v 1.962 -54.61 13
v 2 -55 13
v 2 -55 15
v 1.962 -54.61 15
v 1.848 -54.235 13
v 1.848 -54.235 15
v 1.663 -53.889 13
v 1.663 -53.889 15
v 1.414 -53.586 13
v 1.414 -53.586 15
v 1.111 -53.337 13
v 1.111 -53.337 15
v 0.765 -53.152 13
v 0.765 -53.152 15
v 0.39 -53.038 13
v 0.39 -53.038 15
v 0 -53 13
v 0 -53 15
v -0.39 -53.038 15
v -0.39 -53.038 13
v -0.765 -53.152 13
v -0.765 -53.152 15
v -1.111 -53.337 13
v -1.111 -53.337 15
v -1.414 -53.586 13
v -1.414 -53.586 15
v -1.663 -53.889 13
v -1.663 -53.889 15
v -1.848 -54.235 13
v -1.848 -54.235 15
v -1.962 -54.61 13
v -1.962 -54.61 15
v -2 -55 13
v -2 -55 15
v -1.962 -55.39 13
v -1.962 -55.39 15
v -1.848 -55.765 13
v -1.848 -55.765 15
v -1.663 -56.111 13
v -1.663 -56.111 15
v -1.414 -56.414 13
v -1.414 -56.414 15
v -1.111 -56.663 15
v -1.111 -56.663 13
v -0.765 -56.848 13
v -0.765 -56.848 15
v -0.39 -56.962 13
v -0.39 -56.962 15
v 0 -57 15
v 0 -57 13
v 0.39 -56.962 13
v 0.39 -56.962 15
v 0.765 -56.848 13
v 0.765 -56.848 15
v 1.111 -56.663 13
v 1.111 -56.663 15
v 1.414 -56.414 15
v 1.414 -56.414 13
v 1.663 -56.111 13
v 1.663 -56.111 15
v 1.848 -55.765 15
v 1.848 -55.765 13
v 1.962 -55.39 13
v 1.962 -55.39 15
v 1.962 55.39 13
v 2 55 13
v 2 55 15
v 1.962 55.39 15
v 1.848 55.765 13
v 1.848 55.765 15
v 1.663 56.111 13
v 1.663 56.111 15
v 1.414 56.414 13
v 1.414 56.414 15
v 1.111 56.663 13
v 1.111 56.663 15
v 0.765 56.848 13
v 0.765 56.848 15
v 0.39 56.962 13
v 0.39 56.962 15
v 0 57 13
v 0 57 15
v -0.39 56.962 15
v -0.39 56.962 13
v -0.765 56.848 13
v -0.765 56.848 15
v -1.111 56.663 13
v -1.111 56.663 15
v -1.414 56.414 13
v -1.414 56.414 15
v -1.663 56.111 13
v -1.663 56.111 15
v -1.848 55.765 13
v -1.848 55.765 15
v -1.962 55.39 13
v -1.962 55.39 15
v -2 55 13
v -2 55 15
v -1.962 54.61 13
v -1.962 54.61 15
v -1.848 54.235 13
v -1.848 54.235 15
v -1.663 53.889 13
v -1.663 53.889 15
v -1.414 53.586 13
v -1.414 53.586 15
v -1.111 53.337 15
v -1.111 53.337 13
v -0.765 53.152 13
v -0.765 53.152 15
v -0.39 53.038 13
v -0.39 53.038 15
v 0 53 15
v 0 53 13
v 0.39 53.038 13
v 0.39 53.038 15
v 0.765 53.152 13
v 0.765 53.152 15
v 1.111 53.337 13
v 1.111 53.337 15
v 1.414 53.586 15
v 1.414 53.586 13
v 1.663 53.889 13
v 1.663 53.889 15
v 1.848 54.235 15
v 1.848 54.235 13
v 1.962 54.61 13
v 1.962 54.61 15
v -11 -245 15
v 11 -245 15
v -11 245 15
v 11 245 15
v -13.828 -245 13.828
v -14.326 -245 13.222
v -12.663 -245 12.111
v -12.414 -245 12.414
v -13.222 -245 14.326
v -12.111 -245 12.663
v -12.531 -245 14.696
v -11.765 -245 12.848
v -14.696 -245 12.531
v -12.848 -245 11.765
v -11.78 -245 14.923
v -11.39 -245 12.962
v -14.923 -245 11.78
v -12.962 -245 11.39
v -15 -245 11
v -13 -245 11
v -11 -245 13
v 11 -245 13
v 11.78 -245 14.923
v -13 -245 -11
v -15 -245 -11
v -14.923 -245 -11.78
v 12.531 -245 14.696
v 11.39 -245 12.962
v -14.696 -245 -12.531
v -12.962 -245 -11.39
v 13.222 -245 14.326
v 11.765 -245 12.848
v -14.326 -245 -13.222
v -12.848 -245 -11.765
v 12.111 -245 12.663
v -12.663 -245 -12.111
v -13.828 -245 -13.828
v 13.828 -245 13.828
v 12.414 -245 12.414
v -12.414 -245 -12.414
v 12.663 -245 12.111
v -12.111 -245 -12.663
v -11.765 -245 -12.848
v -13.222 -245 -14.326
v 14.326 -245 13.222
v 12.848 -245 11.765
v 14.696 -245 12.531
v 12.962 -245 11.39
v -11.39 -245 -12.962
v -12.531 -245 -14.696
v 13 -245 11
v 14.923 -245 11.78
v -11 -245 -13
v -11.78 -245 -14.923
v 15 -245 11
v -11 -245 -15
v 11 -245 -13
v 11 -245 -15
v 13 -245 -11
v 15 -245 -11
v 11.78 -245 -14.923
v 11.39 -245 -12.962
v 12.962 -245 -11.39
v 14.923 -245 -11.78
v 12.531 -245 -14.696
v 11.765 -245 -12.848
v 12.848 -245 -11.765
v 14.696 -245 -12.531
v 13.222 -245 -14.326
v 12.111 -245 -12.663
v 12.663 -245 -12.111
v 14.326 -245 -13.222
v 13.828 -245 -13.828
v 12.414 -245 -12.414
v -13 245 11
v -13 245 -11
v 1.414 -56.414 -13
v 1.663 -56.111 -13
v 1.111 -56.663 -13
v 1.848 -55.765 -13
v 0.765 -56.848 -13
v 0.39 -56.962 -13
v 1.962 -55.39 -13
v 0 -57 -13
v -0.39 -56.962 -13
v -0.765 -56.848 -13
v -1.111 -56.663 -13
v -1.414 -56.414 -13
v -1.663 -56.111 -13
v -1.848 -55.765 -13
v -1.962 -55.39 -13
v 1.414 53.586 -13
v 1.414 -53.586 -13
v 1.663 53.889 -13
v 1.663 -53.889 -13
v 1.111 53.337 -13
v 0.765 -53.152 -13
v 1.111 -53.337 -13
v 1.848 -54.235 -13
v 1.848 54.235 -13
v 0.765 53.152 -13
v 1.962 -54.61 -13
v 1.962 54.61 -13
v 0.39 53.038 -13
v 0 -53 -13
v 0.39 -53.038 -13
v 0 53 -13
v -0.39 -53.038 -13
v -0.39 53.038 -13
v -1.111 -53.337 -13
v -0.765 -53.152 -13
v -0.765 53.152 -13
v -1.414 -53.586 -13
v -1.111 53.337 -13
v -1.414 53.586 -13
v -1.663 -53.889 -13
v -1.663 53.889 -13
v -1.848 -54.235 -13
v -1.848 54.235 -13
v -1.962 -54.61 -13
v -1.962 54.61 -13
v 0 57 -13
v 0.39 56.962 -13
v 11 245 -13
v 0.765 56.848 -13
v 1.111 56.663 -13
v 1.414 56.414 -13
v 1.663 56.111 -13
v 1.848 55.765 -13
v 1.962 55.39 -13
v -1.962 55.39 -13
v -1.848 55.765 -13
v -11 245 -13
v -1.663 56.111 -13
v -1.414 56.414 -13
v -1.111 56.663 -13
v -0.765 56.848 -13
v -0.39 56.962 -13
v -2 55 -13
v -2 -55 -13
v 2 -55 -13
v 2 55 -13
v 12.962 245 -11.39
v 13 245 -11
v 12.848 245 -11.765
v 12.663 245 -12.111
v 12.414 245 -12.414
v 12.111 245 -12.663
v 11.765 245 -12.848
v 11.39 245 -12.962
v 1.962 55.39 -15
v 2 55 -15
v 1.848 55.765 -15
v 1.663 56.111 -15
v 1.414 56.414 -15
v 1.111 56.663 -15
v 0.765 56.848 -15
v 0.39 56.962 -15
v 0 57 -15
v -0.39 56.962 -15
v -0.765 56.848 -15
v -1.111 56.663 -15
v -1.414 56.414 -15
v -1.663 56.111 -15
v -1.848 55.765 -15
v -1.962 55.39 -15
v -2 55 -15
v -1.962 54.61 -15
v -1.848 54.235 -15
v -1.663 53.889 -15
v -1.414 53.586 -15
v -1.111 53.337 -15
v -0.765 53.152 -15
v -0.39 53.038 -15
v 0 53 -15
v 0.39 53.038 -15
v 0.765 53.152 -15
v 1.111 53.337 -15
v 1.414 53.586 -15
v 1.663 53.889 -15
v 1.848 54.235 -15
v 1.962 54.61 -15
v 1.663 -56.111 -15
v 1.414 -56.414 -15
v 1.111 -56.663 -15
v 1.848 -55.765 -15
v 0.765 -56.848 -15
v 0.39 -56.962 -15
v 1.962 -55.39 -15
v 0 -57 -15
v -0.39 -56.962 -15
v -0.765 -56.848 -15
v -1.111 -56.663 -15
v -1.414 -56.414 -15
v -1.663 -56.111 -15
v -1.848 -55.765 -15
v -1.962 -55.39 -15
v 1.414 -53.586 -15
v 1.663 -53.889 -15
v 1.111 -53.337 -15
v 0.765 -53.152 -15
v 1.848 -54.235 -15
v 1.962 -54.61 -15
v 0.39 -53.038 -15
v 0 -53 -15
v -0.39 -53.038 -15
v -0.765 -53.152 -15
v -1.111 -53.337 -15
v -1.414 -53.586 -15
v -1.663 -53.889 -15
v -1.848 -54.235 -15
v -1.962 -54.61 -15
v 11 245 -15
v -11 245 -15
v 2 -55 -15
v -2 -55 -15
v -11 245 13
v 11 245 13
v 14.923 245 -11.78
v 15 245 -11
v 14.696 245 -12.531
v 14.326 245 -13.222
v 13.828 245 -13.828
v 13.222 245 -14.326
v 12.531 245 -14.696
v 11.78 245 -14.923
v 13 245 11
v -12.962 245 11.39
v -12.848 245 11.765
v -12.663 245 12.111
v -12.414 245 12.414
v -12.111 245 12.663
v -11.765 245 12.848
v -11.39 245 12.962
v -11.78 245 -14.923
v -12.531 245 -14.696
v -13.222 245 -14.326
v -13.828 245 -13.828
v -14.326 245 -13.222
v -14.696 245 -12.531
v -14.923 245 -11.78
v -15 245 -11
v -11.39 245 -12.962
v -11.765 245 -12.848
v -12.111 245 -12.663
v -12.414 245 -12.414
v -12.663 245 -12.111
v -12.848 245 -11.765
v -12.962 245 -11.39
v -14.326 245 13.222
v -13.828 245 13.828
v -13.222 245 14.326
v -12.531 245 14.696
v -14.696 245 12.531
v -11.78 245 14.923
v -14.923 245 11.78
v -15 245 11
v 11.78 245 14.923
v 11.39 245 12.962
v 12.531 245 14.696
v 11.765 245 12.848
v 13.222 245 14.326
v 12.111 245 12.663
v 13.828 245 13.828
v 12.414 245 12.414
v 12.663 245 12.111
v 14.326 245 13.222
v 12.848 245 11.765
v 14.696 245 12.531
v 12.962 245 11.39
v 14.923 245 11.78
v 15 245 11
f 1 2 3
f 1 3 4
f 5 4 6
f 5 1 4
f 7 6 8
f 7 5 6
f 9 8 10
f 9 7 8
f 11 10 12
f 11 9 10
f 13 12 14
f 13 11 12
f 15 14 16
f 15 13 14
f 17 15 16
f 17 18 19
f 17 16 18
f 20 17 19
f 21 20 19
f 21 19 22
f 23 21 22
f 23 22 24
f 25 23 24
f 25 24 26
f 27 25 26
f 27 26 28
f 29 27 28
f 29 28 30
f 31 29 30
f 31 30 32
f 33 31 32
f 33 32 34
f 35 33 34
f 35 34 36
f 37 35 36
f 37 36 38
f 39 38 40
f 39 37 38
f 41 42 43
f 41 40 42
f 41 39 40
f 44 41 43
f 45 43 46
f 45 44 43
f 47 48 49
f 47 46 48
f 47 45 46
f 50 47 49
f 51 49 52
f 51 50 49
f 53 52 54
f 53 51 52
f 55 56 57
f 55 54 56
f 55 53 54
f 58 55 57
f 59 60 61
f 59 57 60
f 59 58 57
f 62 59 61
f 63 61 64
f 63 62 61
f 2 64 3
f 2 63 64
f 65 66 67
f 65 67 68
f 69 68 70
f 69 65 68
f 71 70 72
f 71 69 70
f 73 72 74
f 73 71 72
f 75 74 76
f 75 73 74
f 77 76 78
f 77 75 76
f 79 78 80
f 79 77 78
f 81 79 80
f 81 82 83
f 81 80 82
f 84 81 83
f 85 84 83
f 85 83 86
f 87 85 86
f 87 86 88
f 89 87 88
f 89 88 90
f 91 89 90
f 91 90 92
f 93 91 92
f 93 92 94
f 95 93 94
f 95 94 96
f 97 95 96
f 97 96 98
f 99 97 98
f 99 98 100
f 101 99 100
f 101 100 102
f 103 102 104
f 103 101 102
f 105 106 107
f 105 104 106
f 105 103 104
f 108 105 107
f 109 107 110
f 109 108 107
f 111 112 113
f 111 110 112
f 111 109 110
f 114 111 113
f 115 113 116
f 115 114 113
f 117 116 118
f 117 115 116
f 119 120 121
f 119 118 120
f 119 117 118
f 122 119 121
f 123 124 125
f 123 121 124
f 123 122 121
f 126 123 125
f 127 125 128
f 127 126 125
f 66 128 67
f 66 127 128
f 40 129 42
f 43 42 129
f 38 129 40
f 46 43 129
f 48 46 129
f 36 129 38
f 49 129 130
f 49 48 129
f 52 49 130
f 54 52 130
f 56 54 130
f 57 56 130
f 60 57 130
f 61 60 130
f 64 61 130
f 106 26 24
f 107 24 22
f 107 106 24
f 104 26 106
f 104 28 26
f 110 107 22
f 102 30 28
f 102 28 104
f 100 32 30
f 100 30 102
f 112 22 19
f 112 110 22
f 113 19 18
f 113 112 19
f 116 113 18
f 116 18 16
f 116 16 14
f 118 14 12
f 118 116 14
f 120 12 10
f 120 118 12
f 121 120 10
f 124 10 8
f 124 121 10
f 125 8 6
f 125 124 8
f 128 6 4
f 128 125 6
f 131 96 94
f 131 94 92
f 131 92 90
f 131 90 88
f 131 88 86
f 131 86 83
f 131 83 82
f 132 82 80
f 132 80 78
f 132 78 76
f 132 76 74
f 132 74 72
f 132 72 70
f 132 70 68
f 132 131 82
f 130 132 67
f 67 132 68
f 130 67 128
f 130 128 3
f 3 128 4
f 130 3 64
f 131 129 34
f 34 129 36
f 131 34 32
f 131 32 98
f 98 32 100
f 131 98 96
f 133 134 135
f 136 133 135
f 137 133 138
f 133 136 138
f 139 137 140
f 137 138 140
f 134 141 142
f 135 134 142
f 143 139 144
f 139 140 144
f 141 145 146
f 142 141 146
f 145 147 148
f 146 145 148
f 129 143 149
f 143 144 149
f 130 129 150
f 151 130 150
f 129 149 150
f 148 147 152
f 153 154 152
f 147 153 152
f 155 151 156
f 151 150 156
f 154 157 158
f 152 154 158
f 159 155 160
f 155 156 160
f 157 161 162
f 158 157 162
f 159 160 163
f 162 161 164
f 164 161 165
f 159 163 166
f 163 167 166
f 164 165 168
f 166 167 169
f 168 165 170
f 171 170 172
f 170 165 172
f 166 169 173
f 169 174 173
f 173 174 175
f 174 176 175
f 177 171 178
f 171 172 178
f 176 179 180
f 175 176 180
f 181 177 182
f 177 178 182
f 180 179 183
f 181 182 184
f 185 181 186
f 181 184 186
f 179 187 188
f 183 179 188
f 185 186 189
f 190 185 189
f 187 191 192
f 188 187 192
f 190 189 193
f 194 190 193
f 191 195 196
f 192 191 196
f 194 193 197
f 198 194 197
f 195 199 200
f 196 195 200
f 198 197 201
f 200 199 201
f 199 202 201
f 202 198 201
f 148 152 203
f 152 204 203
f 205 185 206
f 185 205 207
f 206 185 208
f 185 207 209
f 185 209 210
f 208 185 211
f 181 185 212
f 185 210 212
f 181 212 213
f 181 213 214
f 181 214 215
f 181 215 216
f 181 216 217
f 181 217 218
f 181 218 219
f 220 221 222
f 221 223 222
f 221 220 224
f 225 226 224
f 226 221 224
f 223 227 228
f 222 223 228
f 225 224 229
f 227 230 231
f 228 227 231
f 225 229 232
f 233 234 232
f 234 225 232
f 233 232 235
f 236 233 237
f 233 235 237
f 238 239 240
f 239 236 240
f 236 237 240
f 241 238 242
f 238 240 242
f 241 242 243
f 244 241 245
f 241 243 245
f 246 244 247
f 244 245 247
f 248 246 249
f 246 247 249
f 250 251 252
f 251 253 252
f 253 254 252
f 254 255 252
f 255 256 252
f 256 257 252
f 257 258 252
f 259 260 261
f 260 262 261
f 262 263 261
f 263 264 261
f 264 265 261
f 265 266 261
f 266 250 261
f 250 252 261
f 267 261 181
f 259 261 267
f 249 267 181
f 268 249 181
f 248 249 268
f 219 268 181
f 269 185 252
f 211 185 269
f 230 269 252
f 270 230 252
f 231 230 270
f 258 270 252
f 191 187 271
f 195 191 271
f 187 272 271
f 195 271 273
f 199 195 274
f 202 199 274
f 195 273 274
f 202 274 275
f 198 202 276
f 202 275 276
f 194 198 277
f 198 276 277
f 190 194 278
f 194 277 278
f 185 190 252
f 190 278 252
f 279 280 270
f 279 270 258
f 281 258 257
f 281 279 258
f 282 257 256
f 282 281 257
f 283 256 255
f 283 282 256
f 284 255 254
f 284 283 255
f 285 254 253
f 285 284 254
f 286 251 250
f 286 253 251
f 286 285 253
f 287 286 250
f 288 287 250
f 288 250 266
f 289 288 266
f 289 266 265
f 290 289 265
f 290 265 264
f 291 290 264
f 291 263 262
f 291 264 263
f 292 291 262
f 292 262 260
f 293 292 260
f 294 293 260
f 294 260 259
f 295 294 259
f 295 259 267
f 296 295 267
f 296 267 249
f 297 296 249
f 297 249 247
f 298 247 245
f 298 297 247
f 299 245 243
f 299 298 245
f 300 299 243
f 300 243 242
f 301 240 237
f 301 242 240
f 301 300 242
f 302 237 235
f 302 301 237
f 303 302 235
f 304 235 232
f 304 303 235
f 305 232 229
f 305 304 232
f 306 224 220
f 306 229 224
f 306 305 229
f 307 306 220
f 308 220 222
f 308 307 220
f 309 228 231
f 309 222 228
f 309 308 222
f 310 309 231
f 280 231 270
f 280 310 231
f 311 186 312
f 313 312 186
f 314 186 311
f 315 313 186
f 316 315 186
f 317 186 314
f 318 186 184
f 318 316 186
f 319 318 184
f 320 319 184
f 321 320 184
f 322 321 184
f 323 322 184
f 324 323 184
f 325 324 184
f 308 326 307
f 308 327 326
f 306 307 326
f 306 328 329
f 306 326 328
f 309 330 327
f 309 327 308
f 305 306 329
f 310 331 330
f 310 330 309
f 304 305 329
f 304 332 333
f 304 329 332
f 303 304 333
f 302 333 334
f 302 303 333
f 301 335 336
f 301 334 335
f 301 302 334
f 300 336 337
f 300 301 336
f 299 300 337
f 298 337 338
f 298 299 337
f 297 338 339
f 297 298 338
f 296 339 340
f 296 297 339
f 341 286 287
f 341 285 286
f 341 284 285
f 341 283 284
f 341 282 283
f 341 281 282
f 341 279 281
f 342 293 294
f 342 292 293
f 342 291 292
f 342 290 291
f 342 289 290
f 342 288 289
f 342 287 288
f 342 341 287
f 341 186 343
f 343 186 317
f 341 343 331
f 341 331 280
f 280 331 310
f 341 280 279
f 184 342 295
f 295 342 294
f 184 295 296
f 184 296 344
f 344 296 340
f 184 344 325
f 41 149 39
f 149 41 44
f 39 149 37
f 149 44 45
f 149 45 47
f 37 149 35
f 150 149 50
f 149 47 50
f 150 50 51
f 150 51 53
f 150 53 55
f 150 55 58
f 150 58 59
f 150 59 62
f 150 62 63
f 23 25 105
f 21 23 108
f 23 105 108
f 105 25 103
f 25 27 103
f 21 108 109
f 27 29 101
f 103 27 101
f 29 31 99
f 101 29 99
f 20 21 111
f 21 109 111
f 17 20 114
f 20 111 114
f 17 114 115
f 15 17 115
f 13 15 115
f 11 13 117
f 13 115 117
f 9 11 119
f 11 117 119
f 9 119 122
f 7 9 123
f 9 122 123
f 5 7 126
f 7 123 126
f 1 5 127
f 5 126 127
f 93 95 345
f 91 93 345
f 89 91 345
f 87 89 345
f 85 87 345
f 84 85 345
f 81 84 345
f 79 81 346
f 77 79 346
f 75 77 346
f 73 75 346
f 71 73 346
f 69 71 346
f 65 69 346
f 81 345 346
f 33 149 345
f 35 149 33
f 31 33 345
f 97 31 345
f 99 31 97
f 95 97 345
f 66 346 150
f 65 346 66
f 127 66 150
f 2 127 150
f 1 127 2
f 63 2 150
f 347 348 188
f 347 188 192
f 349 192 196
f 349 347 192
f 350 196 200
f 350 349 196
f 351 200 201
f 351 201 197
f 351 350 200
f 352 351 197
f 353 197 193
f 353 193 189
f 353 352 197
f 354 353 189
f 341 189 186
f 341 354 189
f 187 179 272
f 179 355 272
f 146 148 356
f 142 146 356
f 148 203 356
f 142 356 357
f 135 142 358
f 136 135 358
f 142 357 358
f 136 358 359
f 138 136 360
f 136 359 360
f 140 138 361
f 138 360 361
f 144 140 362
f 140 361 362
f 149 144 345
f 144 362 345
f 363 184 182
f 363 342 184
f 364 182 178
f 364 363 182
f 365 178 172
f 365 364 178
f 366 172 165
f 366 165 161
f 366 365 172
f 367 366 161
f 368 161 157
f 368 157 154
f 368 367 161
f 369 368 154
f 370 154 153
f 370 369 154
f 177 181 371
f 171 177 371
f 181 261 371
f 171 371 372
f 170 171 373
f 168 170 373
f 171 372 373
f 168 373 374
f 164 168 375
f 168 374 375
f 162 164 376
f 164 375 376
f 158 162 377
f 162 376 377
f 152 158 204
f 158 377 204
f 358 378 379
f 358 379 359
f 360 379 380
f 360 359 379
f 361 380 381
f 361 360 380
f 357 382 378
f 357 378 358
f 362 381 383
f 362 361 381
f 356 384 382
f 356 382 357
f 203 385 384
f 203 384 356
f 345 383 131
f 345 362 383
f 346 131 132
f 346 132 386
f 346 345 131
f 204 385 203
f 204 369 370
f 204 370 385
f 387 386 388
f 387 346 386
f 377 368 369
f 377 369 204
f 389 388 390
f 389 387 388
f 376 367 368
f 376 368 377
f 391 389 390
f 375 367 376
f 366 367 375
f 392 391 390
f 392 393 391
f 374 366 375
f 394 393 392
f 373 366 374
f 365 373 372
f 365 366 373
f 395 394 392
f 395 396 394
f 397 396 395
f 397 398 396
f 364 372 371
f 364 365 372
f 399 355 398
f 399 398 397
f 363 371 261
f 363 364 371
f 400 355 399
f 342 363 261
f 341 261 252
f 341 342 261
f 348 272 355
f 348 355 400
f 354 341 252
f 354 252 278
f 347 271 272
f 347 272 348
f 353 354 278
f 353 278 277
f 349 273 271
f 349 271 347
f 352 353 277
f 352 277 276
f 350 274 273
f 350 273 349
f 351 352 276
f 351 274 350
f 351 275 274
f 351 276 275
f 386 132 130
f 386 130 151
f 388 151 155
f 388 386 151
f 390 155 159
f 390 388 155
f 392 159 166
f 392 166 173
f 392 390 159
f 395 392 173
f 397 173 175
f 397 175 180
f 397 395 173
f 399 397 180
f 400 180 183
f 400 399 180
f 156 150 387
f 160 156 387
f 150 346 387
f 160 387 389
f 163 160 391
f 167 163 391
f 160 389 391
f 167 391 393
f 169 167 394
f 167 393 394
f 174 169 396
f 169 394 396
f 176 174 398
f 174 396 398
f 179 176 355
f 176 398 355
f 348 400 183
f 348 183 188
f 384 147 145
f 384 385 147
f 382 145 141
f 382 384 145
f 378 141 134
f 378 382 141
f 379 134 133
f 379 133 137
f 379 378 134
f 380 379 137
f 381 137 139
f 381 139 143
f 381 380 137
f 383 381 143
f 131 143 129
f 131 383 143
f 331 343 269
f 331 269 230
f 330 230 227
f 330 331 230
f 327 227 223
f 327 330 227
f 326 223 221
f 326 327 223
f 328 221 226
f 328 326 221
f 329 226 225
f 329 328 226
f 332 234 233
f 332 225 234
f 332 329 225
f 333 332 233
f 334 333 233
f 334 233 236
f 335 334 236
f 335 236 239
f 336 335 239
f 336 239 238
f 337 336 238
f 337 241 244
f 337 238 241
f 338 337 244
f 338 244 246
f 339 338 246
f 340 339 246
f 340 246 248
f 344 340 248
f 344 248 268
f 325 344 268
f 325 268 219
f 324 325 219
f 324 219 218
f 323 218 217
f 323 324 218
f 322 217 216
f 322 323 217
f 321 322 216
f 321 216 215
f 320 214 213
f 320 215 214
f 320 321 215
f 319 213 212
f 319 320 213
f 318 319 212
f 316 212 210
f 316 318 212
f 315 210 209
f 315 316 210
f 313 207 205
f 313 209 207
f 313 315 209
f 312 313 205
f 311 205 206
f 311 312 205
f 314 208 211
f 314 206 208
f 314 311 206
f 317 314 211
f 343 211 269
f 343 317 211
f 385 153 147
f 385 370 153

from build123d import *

# Parameters (mm, degrees)
EXTRUDE_1_DEPTH          = 245
CUT_EXTRUDE_1_DEPTH      = 246.916652547
CUT_EXTRUDE_1_DEPTH_BACK = 246.916652547
SKETCH_2_R               = 2


with BuildPart() as part:
    # 草图1 → 凸台-拉伸1 (new, symmetric)
    with BuildSketch(Plane(origin=(0, 0, 0), x_dir=(1, 0, 0), z_dir=(0, 1, 0))):
        with BuildLine():
            Line((-11, -15), (11, -15))
            ThreePointArc((11, -15), (13.828427125, -13.828427125), (15, -11))
            Line((15, -11), (15, 11))
            ThreePointArc((15, 11), (13.828427125, 13.828427125), (11, 15))
            Line((11, 15), (-11, 15))
            ThreePointArc((-11, 15), (-13.828427125, 13.828427125), (-15, 11))
            Line((-15, 11), (-15, -11))
            ThreePointArc((-15, -11), (-13.828427125, -13.828427125), (-11, -15))
        make_face()
        with BuildLine():
            Line((-11, -13), (11, -13))
            ThreePointArc((11, -13), (12.414213562, -12.414213562), (13, -11))
            Line((13, -11), (13, 11))
            ThreePointArc((13, 11), (12.414213562, 12.414213562), (11, 13))
            Line((11, 13), (-11, 13))
            ThreePointArc((-11, 13), (-12.414213562, 12.414213562), (-13, 11))
            Line((-13, 11), (-13, -11))
            ThreePointArc((-13, -11), (-12.414213562, -12.414213562), (-11, -13))
        make_face(mode=Mode.SUBTRACT)
    extrude(amount=EXTRUDE_1_DEPTH, both=True)

    # 草图2 → 切除-拉伸1 (cut, two sides: drawn at the far end of the back side and taken through both)
    with BuildSketch(Plane.XY.offset(-CUT_EXTRUDE_1_DEPTH_BACK)):
        with Locations((0, 55)):
            Circle(SKETCH_2_R)
        with Locations((0, -55)):
            Circle(SKETCH_2_R)
    extrude(amount=CUT_EXTRUDE_1_DEPTH + CUT_EXTRUDE_1_DEPTH_BACK, mode=Mode.SUBTRACT)


solid = part.part
